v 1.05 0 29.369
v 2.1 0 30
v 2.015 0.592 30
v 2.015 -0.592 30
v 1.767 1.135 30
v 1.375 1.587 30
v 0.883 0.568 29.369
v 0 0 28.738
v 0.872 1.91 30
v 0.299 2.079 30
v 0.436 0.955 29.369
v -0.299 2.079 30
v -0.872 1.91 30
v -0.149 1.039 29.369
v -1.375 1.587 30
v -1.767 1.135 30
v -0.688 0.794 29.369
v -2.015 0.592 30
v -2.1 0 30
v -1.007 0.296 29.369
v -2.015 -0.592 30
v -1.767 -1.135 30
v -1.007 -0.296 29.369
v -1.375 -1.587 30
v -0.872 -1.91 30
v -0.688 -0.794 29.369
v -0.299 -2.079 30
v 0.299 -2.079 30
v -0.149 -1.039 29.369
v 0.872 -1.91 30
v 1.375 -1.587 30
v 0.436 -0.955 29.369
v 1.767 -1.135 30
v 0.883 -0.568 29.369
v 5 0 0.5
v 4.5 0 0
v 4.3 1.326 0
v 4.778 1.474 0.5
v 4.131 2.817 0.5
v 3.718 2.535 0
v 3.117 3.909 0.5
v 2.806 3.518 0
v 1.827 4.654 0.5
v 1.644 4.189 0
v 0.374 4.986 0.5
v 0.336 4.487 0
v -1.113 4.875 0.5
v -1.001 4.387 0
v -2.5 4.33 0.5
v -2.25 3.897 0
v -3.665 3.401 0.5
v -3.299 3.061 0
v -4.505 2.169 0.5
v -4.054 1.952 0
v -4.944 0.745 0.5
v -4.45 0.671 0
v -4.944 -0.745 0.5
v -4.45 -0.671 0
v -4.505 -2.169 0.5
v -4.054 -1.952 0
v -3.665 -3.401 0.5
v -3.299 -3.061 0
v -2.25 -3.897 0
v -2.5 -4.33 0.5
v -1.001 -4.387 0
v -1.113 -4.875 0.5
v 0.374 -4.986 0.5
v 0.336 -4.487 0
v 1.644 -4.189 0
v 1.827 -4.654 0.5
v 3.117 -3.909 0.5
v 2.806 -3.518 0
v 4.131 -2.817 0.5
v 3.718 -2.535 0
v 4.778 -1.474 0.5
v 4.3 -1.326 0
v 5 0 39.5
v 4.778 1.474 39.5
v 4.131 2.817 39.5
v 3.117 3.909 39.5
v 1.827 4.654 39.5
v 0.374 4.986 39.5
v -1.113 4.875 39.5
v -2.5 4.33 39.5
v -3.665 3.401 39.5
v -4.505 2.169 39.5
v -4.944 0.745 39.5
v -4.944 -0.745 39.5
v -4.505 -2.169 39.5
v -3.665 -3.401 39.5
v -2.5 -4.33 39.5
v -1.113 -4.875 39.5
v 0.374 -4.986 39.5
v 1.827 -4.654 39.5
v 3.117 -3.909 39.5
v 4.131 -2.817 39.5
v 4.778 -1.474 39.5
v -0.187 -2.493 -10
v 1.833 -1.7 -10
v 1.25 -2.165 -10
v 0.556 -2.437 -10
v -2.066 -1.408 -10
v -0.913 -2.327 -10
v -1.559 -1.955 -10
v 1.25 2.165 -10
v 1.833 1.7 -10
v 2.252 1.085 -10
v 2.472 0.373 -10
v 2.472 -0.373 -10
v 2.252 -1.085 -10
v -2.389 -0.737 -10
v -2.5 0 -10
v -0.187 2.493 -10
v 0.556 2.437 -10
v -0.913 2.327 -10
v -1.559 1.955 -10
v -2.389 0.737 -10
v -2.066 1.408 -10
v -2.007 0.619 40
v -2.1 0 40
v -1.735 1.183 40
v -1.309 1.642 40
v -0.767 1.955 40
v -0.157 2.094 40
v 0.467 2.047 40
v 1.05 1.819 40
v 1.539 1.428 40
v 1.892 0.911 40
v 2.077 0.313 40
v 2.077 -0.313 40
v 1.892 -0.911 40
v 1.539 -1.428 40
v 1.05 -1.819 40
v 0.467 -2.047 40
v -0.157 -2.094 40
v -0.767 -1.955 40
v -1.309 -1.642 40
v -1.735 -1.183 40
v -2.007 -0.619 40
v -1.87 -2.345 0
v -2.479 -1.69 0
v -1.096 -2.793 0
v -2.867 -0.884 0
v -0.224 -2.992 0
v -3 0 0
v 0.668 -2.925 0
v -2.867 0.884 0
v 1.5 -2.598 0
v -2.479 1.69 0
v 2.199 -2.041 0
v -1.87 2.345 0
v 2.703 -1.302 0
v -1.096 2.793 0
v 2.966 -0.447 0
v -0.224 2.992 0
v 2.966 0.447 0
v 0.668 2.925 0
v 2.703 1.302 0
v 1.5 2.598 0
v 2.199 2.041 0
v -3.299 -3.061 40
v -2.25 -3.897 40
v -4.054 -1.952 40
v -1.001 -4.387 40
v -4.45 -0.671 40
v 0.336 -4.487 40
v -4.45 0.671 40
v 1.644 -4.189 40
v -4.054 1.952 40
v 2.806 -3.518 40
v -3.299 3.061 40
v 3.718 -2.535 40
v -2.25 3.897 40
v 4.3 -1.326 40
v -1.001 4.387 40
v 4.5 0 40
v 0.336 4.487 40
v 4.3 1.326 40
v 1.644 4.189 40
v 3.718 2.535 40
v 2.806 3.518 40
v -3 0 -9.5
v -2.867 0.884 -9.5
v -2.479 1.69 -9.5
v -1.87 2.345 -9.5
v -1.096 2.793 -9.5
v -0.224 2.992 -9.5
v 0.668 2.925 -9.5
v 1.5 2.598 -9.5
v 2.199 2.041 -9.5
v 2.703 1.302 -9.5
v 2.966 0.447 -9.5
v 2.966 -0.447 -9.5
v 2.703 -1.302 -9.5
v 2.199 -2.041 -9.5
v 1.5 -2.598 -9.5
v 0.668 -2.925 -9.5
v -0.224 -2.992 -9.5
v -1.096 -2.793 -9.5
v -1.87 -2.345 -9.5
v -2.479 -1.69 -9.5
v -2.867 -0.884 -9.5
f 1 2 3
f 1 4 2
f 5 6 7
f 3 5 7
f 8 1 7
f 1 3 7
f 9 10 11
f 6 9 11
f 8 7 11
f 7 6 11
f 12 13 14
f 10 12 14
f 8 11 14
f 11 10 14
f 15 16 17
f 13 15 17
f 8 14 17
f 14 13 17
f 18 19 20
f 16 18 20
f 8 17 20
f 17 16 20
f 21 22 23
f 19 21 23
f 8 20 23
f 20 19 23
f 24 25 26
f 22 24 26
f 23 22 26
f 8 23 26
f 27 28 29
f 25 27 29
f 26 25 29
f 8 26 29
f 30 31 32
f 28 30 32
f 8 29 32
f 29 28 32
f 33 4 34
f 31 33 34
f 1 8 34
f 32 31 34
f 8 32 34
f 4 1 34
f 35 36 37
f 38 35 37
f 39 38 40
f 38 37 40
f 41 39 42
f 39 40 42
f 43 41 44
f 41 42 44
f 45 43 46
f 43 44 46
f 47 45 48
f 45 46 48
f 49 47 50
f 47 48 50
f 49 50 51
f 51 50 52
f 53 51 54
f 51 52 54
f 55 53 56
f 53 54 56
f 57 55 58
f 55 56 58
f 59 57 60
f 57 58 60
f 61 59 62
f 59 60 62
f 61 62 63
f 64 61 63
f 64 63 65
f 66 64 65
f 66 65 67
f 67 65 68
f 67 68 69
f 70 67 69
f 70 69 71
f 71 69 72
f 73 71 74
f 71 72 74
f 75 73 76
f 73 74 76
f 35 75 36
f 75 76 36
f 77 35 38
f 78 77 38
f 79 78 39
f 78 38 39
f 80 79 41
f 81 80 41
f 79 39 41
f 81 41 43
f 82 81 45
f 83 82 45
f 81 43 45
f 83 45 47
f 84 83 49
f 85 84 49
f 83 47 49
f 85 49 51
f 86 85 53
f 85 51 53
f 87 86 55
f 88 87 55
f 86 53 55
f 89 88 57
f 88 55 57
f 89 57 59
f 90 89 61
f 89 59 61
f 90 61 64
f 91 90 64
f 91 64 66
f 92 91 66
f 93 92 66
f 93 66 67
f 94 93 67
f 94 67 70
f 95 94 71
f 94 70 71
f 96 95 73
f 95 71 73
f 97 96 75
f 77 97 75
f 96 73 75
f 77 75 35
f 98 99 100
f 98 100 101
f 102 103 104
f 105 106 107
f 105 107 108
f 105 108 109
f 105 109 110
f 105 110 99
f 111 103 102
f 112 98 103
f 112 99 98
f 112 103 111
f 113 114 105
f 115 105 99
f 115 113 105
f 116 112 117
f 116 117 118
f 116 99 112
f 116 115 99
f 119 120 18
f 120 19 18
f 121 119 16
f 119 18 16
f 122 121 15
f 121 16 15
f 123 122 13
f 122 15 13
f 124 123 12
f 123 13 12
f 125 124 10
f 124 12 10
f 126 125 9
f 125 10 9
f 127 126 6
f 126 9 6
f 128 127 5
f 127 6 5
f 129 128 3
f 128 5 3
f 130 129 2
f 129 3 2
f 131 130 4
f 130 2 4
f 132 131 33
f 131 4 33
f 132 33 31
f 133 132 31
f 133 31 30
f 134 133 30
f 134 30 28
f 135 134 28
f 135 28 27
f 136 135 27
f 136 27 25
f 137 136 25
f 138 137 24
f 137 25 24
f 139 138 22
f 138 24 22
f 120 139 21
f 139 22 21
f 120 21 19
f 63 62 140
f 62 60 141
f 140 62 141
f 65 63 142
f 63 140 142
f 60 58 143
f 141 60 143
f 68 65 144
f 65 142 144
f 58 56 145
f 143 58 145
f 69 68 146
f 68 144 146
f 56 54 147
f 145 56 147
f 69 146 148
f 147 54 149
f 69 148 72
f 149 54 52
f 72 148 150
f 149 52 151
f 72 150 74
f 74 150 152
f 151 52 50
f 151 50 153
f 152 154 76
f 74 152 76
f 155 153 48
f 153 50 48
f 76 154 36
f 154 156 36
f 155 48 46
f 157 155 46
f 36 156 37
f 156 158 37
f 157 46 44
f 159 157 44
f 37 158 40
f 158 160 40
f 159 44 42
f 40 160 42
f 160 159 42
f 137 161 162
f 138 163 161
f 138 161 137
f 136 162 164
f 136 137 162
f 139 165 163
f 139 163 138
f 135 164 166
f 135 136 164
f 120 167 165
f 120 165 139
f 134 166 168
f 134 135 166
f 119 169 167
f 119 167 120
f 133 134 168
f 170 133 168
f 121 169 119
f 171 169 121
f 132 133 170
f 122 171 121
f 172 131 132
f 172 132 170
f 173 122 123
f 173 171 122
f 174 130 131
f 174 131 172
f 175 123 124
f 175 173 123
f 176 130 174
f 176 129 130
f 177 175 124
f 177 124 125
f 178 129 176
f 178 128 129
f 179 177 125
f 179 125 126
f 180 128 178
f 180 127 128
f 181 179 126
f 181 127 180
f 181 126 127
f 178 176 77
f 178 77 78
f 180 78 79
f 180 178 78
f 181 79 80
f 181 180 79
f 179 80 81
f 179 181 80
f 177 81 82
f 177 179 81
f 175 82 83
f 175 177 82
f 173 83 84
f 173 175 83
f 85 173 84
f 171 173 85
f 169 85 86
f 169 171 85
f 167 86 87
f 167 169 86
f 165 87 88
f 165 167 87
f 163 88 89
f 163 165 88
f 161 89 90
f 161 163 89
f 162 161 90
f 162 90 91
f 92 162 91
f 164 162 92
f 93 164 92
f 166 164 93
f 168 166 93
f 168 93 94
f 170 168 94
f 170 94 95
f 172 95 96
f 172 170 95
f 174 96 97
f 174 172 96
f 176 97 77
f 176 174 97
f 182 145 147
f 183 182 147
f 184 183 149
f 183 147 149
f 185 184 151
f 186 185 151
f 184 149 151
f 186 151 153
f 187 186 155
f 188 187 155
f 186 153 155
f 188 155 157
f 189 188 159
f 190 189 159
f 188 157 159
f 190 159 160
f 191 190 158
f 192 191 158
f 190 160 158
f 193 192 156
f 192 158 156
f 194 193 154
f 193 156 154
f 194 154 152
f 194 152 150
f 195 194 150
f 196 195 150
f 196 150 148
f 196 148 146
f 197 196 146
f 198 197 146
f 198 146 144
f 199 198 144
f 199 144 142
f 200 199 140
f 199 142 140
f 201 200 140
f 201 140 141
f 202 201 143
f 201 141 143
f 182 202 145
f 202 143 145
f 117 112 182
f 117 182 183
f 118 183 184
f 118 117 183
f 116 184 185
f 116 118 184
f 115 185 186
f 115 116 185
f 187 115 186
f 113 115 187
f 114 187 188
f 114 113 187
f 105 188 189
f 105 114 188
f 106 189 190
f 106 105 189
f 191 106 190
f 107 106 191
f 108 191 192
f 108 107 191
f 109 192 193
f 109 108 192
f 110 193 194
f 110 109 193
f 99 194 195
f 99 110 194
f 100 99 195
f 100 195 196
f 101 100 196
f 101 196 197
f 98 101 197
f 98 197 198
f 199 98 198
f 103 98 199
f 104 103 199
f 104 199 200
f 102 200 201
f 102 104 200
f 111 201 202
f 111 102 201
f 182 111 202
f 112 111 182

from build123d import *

# Parameters (mm, degrees)
ESQUISSE1_R                                   = 5
BOSS_EXTRU_1_DEPTH                            = 40
ESQUISSE2_R                                   = 3
BOSS_EXTRU_2_DEPTH                            = 10
TROU_POUR_TARAUDAGE_POUR_TROU_TARAUD_M5_D     = 4.2
TROU_POUR_TARAUDAGE_POUR_TROU_TARAUD_M5_DEPTH = 10
TROU_POUR_TARAUDAGE_POUR_TROU_TARAUD_M5_TIP   = 1.2618073
CHANFREIN1_SIZE                               = 0.5


with BuildPart() as part:
    # Esquisse1 → Boss.-Extru.1 (new body)
    with BuildSketch(Plane.XY):
        Circle(ESQUISSE1_R)
    extrude(amount=BOSS_EXTRU_1_DEPTH)

    # Esquisse2 → Boss.-Extru.2 (add)
    with BuildSketch(Plane(origin=(0, 0, 0), x_dir=(-1, 0, 0), z_dir=(0, 0, -1))):
        Circle(ESQUISSE2_R)
    extrude(amount=BOSS_EXTRU_2_DEPTH)

    # Trou pour taraudage pour trou taraudé M51
    with Locations(Plane.XY.offset(40)):
        with Locations((0, 0)):
            Hole(TROU_POUR_TARAUDAGE_POUR_TROU_TARAUD_M5_D / 2, depth=TROU_POUR_TARAUDAGE_POUR_TROU_TARAUD_M5_DEPTH)
            with Locations((0, 0, -(TROU_POUR_TARAUDAGE_POUR_TROU_TARAUD_M5_DEPTH + TROU_POUR_TARAUDAGE_POUR_TROU_TARAUD_M5_TIP / 2))):  # 118° drill point
                Cone(0, TROU_POUR_TARAUDAGE_POUR_TROU_TARAUD_M5_D / 2, TROU_POUR_TARAUDAGE_POUR_TROU_TARAUD_M5_TIP, mode=Mode.SUBTRACT)

    # Chanfrein1
    chanfrein1_edges = [part.edges().sort_by_distance(p)[0] for p in [
        (-5, 0, 0),
        (-5, 0, 40),
        (3, 0, -10),
    ]]
    chamfer(chanfrein1_edges, length=CHANFREIN1_SIZE)


solid = part.part
